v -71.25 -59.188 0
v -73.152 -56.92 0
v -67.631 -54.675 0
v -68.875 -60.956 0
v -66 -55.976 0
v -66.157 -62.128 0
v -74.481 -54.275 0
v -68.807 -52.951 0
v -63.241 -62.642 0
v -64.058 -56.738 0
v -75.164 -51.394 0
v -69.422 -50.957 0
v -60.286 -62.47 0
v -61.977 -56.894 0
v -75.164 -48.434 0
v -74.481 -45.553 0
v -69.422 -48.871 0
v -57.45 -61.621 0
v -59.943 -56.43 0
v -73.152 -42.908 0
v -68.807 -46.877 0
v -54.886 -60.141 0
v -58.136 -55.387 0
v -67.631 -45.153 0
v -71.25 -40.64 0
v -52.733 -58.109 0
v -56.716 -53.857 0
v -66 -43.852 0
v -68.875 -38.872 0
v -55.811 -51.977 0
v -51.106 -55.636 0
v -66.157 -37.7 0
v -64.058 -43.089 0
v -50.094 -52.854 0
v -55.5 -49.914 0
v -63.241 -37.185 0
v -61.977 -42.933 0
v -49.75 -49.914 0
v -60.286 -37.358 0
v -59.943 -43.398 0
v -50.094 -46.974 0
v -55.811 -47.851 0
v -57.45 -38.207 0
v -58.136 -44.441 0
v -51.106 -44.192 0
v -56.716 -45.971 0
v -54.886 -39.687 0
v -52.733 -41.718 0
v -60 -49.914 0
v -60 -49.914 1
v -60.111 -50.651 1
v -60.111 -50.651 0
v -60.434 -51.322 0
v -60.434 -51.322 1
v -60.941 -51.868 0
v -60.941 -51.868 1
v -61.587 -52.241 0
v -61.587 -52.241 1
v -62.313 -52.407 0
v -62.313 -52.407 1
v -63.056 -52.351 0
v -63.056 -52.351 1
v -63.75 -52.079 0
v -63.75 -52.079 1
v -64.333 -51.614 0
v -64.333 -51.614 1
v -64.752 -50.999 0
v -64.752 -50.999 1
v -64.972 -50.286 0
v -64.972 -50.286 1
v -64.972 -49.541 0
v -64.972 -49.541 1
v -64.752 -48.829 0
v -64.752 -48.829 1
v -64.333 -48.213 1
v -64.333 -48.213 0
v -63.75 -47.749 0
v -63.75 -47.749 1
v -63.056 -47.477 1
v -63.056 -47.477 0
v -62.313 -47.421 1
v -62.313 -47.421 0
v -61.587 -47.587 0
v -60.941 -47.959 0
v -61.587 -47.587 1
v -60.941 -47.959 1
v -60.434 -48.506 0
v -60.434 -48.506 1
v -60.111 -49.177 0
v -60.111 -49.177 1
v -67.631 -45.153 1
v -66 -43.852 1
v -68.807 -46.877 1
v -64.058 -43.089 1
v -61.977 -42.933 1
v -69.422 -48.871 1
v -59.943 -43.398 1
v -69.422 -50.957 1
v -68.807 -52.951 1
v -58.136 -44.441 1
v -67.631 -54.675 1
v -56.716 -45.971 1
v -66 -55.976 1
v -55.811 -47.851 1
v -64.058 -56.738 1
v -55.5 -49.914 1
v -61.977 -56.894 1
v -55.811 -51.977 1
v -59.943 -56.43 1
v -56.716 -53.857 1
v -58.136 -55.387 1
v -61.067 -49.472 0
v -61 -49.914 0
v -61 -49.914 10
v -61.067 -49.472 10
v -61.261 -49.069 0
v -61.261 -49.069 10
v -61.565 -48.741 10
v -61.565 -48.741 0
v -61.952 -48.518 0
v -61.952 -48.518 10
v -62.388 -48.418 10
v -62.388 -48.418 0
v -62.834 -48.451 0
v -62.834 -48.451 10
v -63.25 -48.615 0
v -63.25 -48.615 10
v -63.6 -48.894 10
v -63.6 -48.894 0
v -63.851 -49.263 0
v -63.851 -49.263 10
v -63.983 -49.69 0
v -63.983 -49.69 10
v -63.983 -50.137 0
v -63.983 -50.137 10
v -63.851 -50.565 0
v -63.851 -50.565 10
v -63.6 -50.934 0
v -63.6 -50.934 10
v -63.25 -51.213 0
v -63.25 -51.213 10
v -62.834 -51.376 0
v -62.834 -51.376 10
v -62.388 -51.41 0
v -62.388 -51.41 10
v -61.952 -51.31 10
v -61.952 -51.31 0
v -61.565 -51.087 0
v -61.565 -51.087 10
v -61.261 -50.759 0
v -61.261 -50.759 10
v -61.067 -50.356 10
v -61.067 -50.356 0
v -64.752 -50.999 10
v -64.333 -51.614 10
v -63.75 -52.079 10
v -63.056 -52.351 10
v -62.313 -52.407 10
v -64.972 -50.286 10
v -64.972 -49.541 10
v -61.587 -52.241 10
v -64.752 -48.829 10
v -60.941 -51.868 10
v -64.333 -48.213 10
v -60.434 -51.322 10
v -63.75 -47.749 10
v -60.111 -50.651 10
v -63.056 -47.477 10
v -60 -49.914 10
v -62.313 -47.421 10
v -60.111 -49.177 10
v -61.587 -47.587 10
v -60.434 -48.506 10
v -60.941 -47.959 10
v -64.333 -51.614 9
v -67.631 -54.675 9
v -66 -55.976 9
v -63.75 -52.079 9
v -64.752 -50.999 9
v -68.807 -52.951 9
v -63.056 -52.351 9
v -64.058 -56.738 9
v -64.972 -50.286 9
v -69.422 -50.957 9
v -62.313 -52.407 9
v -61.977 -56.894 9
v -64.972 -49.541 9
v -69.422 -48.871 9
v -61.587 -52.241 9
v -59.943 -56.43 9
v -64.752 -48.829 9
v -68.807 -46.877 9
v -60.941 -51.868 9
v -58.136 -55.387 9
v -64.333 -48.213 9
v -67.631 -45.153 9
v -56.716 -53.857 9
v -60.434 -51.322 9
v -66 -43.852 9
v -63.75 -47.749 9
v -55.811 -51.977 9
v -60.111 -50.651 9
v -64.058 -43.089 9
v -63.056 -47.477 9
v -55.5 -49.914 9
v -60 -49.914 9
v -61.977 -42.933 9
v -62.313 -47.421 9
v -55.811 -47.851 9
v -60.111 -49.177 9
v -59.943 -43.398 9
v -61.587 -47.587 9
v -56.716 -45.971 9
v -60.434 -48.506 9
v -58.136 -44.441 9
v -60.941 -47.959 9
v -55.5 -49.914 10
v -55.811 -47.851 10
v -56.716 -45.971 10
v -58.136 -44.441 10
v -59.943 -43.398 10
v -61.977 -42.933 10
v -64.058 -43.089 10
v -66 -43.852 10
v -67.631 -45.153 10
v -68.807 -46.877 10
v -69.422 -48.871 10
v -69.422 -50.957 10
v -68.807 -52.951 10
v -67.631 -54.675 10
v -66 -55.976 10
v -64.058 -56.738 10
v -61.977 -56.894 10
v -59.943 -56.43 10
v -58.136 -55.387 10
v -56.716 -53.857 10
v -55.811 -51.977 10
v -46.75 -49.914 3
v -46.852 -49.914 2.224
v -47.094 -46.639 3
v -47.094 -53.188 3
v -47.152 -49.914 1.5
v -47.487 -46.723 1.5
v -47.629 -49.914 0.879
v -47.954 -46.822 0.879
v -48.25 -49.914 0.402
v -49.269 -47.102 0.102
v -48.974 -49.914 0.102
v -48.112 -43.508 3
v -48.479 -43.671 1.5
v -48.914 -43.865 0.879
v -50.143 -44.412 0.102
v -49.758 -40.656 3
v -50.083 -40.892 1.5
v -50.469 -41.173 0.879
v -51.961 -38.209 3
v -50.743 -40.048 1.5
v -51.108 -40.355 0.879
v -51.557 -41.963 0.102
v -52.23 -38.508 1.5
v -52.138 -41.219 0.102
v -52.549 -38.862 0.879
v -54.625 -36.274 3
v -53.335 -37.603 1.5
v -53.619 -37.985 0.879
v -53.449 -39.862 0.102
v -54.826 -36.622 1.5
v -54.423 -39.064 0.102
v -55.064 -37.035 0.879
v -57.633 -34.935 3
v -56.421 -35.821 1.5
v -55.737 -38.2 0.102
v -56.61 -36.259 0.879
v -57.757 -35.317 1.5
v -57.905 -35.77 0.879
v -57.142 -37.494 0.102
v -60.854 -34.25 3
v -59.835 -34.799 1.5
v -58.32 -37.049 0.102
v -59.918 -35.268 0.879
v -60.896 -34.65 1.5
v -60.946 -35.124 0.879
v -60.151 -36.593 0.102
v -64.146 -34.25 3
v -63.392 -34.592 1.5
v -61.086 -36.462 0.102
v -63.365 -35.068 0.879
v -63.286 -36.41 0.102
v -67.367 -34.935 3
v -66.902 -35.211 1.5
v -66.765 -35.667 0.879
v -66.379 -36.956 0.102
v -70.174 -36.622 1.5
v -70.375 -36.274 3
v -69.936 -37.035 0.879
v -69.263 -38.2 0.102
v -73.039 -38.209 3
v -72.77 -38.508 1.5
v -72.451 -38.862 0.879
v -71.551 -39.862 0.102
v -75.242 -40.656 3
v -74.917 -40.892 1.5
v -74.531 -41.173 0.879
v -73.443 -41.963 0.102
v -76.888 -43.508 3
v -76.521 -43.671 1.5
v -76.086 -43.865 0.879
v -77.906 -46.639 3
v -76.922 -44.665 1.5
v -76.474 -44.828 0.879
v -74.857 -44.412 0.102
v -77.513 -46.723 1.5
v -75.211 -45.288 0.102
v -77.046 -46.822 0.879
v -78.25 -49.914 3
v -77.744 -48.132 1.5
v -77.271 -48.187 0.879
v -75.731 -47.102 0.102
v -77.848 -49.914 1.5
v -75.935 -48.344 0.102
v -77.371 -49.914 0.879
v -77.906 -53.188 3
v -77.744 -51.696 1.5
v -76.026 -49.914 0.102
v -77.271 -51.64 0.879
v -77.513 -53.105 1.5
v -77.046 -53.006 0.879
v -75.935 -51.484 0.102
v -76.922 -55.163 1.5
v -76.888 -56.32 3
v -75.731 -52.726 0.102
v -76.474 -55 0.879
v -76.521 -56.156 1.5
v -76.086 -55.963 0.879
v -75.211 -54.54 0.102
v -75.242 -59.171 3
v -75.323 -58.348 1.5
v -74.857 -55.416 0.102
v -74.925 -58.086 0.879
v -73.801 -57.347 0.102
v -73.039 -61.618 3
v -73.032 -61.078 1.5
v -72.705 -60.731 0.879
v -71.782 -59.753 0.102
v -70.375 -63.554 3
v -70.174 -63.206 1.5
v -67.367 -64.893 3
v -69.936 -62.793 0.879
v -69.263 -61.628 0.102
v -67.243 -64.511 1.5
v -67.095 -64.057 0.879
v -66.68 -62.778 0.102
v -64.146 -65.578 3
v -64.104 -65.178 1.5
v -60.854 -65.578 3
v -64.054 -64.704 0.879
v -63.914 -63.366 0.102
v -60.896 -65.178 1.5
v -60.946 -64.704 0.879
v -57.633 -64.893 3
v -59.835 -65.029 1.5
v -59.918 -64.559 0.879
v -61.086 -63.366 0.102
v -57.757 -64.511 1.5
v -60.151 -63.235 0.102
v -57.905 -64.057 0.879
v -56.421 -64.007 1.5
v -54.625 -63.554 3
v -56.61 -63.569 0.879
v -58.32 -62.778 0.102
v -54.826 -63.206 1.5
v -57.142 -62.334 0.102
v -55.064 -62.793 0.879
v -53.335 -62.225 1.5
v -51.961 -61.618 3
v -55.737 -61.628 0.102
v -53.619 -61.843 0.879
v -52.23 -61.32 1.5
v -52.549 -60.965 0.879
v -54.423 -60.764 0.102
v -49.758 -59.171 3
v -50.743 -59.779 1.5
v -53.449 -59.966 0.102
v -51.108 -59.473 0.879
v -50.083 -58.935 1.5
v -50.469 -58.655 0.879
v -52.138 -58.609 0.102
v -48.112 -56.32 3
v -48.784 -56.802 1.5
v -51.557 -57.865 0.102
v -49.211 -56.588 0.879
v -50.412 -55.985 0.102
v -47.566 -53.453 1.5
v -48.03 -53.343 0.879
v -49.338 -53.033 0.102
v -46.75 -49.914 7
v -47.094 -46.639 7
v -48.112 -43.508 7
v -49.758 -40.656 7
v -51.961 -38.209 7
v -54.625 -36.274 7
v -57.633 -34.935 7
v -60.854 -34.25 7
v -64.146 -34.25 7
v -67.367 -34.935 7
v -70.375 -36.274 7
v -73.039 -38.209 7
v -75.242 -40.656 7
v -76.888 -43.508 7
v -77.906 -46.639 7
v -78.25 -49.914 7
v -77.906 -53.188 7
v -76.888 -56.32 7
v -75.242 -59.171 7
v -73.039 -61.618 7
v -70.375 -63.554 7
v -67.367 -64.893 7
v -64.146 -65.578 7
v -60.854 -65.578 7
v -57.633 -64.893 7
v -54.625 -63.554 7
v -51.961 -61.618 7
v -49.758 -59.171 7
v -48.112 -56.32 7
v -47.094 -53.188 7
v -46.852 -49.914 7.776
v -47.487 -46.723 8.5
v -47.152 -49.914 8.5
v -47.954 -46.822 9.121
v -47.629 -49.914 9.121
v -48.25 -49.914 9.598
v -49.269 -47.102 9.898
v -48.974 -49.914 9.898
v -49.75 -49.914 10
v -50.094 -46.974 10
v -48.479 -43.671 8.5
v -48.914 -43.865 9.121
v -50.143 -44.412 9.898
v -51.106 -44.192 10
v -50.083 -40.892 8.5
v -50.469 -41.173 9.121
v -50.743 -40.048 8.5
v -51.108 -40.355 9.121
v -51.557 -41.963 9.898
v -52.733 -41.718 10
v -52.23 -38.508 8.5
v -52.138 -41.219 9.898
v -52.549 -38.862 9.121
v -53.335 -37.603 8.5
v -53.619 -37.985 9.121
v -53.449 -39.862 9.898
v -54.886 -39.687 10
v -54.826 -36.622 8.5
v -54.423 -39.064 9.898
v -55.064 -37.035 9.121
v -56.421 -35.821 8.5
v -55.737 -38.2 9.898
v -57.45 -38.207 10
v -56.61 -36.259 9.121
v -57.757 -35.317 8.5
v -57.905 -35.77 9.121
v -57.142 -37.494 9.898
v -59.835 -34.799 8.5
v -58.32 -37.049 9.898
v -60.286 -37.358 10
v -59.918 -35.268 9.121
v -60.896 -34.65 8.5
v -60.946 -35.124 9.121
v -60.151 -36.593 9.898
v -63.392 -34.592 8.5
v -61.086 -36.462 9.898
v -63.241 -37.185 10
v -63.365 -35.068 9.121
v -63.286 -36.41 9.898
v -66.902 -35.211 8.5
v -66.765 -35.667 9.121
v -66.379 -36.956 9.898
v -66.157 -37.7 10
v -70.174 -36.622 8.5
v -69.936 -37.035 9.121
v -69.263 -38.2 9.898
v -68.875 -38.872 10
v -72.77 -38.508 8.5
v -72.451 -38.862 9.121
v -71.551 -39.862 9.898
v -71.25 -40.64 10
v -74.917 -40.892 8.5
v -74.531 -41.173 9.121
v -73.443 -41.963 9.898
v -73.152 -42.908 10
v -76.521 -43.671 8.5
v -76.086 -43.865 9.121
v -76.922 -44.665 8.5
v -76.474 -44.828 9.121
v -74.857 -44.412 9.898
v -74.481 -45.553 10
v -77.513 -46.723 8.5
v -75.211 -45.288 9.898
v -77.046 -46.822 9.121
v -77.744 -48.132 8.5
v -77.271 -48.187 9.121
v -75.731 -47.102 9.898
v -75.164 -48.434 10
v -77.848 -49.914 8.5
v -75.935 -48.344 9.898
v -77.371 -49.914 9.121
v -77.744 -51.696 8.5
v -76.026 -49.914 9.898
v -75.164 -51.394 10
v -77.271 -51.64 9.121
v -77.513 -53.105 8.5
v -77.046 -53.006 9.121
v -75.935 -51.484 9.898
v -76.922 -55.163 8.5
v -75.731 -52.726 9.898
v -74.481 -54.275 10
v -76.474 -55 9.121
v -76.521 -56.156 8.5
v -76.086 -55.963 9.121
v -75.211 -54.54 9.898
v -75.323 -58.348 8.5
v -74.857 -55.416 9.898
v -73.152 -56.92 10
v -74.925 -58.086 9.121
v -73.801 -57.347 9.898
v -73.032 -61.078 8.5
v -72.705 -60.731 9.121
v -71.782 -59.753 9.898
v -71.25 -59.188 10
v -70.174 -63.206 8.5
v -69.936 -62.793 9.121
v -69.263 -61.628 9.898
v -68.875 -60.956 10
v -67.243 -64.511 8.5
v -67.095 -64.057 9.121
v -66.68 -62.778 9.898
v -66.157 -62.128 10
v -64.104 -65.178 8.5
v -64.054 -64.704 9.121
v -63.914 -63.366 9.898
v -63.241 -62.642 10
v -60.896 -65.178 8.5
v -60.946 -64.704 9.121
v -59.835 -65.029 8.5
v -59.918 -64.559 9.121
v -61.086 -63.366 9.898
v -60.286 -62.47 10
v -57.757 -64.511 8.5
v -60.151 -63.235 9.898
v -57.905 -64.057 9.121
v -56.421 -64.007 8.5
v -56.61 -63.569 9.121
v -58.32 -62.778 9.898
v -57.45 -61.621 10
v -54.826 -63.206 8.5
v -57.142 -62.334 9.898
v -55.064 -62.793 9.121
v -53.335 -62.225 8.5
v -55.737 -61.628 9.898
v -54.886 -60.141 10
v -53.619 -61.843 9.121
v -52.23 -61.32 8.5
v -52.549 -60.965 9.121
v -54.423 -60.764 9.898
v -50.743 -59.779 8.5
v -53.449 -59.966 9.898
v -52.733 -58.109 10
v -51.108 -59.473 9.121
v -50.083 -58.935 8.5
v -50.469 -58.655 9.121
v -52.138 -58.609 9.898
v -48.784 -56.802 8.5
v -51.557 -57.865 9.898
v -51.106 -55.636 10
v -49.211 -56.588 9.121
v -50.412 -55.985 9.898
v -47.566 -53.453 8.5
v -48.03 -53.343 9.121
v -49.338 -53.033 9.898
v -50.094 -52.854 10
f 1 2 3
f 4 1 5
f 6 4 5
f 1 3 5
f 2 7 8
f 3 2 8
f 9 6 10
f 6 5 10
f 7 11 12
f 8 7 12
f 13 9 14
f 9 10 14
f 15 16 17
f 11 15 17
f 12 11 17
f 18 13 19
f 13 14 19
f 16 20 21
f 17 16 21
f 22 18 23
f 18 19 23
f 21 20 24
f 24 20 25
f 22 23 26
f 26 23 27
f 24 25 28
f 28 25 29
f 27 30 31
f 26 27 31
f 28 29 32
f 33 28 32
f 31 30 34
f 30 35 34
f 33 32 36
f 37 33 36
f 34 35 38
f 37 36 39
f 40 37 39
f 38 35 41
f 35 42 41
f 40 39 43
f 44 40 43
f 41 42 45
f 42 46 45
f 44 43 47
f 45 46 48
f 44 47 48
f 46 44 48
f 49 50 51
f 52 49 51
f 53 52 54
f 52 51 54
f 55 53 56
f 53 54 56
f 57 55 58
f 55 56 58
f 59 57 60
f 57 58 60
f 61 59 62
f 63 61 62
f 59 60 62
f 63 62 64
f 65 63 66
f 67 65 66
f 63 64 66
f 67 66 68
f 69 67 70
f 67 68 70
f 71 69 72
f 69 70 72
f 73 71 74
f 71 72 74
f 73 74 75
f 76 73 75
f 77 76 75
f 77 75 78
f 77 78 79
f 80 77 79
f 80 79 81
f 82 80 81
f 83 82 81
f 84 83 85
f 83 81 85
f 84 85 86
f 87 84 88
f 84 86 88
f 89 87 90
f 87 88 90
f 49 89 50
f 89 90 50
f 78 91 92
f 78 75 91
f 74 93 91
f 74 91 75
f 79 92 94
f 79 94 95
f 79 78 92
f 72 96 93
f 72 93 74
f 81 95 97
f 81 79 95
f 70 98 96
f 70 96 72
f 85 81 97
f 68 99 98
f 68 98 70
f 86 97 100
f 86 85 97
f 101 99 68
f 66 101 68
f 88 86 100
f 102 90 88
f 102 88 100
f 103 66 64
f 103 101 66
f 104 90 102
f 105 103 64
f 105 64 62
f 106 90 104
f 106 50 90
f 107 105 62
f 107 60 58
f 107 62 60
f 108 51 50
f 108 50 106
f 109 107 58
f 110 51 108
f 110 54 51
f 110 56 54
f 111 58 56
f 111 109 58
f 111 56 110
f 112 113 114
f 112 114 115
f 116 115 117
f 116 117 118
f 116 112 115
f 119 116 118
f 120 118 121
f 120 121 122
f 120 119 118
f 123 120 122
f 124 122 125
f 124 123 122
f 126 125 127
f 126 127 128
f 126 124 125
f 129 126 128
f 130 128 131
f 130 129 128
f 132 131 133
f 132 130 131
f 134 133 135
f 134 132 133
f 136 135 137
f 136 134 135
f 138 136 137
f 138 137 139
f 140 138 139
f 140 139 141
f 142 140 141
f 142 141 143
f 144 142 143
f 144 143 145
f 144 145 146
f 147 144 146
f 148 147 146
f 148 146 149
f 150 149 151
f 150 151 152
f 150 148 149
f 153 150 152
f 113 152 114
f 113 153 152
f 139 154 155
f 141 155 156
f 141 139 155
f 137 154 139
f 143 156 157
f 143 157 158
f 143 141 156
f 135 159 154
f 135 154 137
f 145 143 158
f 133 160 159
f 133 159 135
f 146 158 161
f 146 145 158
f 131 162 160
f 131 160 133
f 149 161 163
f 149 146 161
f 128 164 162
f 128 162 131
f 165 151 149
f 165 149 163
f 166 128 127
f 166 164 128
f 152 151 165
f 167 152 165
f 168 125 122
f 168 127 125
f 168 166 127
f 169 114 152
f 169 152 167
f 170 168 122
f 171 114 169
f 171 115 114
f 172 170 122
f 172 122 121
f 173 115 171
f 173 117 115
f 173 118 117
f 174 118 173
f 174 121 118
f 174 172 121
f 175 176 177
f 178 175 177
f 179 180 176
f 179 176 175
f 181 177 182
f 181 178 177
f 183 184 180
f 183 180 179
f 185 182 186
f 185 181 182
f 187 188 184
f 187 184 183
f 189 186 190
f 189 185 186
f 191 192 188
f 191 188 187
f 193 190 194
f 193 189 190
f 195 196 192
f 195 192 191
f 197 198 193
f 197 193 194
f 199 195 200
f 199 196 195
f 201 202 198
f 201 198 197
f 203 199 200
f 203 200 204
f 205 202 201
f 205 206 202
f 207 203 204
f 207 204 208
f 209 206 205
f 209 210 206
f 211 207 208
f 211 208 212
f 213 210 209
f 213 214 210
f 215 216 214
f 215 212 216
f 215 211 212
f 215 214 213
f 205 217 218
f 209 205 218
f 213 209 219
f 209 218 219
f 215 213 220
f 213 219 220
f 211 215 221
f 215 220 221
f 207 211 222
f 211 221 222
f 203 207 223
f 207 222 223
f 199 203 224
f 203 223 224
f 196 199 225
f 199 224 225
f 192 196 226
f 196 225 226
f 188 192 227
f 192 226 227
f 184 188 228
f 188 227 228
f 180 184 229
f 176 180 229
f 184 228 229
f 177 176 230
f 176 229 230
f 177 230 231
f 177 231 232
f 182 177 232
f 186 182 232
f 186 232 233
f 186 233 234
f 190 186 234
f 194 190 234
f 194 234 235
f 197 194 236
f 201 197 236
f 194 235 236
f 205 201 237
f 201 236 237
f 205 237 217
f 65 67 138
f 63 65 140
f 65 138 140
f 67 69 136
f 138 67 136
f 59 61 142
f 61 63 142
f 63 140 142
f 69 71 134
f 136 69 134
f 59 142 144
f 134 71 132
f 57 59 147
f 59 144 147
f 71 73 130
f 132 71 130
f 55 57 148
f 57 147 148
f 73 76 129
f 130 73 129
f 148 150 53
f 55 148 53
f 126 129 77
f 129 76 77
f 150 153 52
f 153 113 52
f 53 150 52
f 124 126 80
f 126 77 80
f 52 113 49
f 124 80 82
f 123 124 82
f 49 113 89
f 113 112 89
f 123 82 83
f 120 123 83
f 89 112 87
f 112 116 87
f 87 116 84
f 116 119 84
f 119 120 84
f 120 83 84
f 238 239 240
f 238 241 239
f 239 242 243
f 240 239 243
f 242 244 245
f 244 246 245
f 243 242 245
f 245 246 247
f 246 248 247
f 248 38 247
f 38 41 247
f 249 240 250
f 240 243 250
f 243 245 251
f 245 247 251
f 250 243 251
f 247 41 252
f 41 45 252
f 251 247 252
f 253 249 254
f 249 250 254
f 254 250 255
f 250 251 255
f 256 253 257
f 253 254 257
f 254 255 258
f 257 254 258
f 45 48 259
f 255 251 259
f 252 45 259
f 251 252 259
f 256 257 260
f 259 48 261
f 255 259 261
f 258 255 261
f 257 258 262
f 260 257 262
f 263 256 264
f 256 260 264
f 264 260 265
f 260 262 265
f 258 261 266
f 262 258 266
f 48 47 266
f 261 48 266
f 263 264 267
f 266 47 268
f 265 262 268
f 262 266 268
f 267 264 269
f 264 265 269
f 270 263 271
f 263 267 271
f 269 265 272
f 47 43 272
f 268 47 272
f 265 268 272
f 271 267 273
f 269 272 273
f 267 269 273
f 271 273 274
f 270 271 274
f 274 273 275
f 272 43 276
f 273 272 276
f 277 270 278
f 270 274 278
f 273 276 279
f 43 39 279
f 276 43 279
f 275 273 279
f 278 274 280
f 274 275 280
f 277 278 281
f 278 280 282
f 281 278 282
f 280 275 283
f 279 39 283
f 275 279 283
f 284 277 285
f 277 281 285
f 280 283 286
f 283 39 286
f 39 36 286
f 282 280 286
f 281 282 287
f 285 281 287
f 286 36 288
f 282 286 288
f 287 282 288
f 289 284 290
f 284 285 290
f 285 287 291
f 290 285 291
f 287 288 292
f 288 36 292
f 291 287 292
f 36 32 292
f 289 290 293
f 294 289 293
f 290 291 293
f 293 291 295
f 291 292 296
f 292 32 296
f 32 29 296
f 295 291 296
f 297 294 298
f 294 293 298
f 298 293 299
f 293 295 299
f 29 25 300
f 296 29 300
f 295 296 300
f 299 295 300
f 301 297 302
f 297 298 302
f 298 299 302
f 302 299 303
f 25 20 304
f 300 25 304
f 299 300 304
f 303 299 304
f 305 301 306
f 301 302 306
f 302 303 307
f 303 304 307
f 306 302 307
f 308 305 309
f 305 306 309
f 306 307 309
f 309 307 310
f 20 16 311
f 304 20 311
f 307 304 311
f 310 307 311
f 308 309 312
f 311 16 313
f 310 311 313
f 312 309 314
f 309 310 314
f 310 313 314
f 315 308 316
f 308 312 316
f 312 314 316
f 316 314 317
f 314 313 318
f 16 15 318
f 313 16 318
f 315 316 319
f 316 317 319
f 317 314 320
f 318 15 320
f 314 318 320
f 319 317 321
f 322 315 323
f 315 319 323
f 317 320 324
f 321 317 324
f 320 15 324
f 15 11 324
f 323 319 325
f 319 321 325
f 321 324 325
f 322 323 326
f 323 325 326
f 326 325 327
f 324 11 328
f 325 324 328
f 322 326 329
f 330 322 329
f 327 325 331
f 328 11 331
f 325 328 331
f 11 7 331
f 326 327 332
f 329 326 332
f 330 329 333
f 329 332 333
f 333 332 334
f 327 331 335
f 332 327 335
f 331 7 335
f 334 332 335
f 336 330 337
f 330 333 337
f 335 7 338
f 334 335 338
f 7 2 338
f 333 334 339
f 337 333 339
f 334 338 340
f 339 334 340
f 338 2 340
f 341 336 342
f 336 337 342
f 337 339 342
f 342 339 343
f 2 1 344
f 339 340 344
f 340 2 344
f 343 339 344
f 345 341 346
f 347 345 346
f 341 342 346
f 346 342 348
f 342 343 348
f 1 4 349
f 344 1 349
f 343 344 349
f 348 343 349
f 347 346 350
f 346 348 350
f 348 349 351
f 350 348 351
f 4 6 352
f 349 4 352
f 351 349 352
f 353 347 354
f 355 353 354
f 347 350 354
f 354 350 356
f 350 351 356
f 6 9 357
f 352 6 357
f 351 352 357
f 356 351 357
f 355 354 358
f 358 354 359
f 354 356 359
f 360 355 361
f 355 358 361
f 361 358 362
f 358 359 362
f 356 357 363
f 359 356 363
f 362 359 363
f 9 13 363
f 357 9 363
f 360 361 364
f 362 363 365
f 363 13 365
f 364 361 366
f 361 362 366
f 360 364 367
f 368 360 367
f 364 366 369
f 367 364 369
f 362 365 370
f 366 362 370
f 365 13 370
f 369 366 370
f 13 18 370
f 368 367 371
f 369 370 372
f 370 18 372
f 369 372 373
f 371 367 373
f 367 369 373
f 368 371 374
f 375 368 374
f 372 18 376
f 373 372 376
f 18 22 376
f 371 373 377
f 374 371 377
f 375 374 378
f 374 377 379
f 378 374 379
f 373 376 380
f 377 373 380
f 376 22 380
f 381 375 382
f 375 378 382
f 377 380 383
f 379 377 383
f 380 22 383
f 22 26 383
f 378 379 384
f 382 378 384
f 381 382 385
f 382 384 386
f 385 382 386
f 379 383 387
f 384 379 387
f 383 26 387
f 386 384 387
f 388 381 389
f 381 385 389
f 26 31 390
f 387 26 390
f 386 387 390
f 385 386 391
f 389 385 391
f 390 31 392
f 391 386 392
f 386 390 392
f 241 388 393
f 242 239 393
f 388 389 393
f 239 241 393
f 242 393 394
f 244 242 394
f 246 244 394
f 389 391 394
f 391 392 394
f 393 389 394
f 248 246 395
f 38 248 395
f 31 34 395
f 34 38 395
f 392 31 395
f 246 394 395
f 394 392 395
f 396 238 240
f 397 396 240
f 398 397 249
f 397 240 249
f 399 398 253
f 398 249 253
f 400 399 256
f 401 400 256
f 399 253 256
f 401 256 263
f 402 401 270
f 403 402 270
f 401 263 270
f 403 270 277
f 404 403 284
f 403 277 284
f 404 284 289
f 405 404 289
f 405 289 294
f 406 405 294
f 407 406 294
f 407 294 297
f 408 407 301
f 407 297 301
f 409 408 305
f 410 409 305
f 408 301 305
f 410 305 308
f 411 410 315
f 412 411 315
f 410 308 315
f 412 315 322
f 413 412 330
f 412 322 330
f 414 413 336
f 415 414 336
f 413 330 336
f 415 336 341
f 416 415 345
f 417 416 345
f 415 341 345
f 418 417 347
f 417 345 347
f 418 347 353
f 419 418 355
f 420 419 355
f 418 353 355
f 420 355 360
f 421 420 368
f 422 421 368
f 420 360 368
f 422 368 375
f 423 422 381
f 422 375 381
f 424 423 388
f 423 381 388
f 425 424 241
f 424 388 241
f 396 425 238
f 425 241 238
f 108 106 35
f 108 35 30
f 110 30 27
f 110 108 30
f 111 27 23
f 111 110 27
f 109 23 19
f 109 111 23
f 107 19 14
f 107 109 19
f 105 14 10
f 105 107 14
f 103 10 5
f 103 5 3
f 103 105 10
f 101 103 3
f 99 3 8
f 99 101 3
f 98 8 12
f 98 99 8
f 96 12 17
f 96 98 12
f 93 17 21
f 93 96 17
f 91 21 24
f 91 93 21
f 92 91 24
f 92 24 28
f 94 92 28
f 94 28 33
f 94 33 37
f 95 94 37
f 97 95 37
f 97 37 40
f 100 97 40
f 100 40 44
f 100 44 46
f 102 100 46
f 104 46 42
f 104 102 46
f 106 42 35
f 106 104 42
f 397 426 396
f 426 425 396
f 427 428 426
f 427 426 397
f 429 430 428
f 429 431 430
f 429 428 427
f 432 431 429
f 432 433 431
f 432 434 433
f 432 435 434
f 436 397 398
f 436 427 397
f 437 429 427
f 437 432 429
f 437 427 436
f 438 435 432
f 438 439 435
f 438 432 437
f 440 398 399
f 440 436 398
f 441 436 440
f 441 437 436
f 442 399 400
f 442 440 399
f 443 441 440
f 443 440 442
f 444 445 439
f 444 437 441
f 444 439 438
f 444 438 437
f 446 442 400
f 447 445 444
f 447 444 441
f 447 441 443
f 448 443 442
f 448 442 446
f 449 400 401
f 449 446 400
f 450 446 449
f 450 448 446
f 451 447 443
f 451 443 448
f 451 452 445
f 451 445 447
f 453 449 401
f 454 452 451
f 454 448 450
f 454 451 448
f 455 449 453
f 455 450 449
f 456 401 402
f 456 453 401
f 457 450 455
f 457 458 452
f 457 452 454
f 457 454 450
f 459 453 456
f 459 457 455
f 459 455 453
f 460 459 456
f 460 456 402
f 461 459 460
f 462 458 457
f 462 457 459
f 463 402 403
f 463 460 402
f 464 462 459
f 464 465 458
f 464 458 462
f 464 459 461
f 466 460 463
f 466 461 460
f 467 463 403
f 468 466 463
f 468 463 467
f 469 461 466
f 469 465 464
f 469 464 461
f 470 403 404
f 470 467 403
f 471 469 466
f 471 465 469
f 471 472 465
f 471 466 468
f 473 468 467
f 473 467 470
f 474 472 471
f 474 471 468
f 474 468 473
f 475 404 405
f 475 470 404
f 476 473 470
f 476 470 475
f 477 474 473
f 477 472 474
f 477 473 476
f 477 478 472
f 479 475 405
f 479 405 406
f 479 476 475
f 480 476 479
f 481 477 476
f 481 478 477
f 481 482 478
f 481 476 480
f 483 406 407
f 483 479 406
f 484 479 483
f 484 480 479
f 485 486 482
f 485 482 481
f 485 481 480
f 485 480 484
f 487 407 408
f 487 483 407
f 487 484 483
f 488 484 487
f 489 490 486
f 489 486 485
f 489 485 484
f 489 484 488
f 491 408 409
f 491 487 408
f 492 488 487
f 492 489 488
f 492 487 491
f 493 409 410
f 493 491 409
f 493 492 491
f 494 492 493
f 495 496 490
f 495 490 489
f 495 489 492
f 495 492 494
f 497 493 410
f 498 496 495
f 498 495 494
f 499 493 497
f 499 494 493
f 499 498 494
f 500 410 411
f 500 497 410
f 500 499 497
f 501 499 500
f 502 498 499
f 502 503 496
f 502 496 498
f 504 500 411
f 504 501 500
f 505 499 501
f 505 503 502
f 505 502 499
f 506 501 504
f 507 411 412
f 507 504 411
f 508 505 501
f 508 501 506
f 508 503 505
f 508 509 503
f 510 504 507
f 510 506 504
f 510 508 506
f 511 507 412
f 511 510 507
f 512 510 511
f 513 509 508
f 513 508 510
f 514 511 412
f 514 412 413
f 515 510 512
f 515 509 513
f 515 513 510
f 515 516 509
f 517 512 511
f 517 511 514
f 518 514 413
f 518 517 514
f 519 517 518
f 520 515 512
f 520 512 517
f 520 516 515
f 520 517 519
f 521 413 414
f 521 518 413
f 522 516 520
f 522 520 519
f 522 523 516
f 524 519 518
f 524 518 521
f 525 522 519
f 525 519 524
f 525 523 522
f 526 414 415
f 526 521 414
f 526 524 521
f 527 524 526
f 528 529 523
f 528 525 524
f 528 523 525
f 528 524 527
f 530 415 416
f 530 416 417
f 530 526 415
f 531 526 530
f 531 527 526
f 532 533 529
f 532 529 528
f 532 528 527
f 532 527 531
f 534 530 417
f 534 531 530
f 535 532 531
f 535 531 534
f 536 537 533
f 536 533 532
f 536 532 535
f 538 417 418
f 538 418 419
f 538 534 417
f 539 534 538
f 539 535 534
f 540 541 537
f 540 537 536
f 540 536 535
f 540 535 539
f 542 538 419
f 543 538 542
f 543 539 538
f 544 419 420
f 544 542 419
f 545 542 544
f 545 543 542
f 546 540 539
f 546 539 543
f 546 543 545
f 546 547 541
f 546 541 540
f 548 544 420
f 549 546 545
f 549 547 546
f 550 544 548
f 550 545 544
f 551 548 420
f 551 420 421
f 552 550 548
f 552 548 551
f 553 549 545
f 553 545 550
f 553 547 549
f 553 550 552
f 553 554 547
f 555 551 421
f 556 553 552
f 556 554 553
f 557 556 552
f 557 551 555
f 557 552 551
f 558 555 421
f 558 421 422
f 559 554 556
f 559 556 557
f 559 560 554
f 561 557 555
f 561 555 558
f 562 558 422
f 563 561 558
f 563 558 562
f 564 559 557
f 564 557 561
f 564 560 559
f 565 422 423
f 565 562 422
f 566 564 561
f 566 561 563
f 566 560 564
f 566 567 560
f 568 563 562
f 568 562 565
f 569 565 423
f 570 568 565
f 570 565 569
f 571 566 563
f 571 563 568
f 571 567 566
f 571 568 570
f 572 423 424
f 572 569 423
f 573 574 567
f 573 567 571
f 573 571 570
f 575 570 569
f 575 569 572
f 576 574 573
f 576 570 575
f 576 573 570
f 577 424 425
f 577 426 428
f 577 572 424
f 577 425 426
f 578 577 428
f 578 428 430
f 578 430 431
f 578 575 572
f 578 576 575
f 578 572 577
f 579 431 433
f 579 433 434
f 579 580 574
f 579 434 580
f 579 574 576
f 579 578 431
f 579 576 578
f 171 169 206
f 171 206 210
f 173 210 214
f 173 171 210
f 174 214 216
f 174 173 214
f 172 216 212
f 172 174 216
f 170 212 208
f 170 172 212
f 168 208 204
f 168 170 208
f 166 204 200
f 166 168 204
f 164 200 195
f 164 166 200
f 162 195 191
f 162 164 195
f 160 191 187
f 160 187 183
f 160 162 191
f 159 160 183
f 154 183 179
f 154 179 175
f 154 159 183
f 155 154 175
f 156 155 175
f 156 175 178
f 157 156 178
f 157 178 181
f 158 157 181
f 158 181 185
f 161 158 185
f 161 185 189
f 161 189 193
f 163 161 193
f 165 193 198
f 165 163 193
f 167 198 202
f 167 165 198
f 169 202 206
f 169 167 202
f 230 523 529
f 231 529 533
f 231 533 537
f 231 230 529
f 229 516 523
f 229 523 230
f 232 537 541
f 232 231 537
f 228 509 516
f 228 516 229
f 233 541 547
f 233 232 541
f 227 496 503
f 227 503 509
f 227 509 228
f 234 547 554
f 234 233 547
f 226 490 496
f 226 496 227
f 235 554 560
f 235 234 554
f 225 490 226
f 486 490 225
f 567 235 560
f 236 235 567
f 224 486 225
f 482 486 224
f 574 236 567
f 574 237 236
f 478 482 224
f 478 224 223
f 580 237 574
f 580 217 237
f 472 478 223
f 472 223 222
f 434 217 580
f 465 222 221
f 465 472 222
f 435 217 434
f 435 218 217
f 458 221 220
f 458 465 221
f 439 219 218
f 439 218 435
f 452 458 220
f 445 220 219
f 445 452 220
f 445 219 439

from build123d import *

# Parameters (mm, degrees)
SKETCH1_R           = 15.75
SKETCH1_R_2         = 1.5
BOSS_EXTRUDE1_DEPTH = 10
SKETCH2_R           = 7
SKETCH2_R_2         = 2.5
CUT_EXTRUDE1_DEPTH  = 1
CUT_EXTRUDE2_START  = -1
SKETCH3_R           = 7
SKETCH3_R_2         = 2.5
CUT_EXTRUDE2_DEPTH  = 1
FILLET1_R           = 3


with BuildPart() as part:
    # Sketch1 → Boss-Extrude1 (new body)
    with BuildSketch(Plane.XY):
        with Locations((-62.5, -49.913872362)):
            Circle(SKETCH1_R)
        with Locations((-62.5, -49.913872362)):
            Circle(SKETCH1_R_2, mode=Mode.SUBTRACT)
    extrude(amount=BOSS_EXTRUDE1_DEPTH)

    # Sketch2 → Cut-Extrude1 (cut)
    with BuildSketch(Plane.XY.offset(10)):
        with Locations((-62.5, -49.913872362)):
            Circle(SKETCH2_R)
        with Locations((-62.5, -49.913872362)):
            Circle(SKETCH2_R_2, mode=Mode.SUBTRACT)
    extrude(amount=-CUT_EXTRUDE1_DEPTH, mode=Mode.SUBTRACT)

    # Sketch3 → Cut-Extrude2 (cut)
    with BuildSketch(Plane(origin=(0, 0, 0), x_dir=(-1, 0, 0), z_dir=(0, 0, -1)).offset(CUT_EXTRUDE2_START)):
        with Locations(Location((62.5, -49.913872362, 0), (0, 0, 180))):
            Circle(SKETCH3_R)
        with Locations(Location((62.5, -49.913872362, 0), (0, 0, 180))):
            Circle(SKETCH3_R_2, mode=Mode.SUBTRACT)
    extrude(amount=CUT_EXTRUDE2_DEPTH, mode=Mode.SUBTRACT)

    # Fillet1
    fillet1_edges = [part.edges().sort_by_distance(p)[0] for p in [
        (-78.25, -49.913872362, 0),
        (-78.25, -49.913872362, 10),
    ]]
    fillet(fillet1_edges, radius=FILLET1_R)


solid = part.part
